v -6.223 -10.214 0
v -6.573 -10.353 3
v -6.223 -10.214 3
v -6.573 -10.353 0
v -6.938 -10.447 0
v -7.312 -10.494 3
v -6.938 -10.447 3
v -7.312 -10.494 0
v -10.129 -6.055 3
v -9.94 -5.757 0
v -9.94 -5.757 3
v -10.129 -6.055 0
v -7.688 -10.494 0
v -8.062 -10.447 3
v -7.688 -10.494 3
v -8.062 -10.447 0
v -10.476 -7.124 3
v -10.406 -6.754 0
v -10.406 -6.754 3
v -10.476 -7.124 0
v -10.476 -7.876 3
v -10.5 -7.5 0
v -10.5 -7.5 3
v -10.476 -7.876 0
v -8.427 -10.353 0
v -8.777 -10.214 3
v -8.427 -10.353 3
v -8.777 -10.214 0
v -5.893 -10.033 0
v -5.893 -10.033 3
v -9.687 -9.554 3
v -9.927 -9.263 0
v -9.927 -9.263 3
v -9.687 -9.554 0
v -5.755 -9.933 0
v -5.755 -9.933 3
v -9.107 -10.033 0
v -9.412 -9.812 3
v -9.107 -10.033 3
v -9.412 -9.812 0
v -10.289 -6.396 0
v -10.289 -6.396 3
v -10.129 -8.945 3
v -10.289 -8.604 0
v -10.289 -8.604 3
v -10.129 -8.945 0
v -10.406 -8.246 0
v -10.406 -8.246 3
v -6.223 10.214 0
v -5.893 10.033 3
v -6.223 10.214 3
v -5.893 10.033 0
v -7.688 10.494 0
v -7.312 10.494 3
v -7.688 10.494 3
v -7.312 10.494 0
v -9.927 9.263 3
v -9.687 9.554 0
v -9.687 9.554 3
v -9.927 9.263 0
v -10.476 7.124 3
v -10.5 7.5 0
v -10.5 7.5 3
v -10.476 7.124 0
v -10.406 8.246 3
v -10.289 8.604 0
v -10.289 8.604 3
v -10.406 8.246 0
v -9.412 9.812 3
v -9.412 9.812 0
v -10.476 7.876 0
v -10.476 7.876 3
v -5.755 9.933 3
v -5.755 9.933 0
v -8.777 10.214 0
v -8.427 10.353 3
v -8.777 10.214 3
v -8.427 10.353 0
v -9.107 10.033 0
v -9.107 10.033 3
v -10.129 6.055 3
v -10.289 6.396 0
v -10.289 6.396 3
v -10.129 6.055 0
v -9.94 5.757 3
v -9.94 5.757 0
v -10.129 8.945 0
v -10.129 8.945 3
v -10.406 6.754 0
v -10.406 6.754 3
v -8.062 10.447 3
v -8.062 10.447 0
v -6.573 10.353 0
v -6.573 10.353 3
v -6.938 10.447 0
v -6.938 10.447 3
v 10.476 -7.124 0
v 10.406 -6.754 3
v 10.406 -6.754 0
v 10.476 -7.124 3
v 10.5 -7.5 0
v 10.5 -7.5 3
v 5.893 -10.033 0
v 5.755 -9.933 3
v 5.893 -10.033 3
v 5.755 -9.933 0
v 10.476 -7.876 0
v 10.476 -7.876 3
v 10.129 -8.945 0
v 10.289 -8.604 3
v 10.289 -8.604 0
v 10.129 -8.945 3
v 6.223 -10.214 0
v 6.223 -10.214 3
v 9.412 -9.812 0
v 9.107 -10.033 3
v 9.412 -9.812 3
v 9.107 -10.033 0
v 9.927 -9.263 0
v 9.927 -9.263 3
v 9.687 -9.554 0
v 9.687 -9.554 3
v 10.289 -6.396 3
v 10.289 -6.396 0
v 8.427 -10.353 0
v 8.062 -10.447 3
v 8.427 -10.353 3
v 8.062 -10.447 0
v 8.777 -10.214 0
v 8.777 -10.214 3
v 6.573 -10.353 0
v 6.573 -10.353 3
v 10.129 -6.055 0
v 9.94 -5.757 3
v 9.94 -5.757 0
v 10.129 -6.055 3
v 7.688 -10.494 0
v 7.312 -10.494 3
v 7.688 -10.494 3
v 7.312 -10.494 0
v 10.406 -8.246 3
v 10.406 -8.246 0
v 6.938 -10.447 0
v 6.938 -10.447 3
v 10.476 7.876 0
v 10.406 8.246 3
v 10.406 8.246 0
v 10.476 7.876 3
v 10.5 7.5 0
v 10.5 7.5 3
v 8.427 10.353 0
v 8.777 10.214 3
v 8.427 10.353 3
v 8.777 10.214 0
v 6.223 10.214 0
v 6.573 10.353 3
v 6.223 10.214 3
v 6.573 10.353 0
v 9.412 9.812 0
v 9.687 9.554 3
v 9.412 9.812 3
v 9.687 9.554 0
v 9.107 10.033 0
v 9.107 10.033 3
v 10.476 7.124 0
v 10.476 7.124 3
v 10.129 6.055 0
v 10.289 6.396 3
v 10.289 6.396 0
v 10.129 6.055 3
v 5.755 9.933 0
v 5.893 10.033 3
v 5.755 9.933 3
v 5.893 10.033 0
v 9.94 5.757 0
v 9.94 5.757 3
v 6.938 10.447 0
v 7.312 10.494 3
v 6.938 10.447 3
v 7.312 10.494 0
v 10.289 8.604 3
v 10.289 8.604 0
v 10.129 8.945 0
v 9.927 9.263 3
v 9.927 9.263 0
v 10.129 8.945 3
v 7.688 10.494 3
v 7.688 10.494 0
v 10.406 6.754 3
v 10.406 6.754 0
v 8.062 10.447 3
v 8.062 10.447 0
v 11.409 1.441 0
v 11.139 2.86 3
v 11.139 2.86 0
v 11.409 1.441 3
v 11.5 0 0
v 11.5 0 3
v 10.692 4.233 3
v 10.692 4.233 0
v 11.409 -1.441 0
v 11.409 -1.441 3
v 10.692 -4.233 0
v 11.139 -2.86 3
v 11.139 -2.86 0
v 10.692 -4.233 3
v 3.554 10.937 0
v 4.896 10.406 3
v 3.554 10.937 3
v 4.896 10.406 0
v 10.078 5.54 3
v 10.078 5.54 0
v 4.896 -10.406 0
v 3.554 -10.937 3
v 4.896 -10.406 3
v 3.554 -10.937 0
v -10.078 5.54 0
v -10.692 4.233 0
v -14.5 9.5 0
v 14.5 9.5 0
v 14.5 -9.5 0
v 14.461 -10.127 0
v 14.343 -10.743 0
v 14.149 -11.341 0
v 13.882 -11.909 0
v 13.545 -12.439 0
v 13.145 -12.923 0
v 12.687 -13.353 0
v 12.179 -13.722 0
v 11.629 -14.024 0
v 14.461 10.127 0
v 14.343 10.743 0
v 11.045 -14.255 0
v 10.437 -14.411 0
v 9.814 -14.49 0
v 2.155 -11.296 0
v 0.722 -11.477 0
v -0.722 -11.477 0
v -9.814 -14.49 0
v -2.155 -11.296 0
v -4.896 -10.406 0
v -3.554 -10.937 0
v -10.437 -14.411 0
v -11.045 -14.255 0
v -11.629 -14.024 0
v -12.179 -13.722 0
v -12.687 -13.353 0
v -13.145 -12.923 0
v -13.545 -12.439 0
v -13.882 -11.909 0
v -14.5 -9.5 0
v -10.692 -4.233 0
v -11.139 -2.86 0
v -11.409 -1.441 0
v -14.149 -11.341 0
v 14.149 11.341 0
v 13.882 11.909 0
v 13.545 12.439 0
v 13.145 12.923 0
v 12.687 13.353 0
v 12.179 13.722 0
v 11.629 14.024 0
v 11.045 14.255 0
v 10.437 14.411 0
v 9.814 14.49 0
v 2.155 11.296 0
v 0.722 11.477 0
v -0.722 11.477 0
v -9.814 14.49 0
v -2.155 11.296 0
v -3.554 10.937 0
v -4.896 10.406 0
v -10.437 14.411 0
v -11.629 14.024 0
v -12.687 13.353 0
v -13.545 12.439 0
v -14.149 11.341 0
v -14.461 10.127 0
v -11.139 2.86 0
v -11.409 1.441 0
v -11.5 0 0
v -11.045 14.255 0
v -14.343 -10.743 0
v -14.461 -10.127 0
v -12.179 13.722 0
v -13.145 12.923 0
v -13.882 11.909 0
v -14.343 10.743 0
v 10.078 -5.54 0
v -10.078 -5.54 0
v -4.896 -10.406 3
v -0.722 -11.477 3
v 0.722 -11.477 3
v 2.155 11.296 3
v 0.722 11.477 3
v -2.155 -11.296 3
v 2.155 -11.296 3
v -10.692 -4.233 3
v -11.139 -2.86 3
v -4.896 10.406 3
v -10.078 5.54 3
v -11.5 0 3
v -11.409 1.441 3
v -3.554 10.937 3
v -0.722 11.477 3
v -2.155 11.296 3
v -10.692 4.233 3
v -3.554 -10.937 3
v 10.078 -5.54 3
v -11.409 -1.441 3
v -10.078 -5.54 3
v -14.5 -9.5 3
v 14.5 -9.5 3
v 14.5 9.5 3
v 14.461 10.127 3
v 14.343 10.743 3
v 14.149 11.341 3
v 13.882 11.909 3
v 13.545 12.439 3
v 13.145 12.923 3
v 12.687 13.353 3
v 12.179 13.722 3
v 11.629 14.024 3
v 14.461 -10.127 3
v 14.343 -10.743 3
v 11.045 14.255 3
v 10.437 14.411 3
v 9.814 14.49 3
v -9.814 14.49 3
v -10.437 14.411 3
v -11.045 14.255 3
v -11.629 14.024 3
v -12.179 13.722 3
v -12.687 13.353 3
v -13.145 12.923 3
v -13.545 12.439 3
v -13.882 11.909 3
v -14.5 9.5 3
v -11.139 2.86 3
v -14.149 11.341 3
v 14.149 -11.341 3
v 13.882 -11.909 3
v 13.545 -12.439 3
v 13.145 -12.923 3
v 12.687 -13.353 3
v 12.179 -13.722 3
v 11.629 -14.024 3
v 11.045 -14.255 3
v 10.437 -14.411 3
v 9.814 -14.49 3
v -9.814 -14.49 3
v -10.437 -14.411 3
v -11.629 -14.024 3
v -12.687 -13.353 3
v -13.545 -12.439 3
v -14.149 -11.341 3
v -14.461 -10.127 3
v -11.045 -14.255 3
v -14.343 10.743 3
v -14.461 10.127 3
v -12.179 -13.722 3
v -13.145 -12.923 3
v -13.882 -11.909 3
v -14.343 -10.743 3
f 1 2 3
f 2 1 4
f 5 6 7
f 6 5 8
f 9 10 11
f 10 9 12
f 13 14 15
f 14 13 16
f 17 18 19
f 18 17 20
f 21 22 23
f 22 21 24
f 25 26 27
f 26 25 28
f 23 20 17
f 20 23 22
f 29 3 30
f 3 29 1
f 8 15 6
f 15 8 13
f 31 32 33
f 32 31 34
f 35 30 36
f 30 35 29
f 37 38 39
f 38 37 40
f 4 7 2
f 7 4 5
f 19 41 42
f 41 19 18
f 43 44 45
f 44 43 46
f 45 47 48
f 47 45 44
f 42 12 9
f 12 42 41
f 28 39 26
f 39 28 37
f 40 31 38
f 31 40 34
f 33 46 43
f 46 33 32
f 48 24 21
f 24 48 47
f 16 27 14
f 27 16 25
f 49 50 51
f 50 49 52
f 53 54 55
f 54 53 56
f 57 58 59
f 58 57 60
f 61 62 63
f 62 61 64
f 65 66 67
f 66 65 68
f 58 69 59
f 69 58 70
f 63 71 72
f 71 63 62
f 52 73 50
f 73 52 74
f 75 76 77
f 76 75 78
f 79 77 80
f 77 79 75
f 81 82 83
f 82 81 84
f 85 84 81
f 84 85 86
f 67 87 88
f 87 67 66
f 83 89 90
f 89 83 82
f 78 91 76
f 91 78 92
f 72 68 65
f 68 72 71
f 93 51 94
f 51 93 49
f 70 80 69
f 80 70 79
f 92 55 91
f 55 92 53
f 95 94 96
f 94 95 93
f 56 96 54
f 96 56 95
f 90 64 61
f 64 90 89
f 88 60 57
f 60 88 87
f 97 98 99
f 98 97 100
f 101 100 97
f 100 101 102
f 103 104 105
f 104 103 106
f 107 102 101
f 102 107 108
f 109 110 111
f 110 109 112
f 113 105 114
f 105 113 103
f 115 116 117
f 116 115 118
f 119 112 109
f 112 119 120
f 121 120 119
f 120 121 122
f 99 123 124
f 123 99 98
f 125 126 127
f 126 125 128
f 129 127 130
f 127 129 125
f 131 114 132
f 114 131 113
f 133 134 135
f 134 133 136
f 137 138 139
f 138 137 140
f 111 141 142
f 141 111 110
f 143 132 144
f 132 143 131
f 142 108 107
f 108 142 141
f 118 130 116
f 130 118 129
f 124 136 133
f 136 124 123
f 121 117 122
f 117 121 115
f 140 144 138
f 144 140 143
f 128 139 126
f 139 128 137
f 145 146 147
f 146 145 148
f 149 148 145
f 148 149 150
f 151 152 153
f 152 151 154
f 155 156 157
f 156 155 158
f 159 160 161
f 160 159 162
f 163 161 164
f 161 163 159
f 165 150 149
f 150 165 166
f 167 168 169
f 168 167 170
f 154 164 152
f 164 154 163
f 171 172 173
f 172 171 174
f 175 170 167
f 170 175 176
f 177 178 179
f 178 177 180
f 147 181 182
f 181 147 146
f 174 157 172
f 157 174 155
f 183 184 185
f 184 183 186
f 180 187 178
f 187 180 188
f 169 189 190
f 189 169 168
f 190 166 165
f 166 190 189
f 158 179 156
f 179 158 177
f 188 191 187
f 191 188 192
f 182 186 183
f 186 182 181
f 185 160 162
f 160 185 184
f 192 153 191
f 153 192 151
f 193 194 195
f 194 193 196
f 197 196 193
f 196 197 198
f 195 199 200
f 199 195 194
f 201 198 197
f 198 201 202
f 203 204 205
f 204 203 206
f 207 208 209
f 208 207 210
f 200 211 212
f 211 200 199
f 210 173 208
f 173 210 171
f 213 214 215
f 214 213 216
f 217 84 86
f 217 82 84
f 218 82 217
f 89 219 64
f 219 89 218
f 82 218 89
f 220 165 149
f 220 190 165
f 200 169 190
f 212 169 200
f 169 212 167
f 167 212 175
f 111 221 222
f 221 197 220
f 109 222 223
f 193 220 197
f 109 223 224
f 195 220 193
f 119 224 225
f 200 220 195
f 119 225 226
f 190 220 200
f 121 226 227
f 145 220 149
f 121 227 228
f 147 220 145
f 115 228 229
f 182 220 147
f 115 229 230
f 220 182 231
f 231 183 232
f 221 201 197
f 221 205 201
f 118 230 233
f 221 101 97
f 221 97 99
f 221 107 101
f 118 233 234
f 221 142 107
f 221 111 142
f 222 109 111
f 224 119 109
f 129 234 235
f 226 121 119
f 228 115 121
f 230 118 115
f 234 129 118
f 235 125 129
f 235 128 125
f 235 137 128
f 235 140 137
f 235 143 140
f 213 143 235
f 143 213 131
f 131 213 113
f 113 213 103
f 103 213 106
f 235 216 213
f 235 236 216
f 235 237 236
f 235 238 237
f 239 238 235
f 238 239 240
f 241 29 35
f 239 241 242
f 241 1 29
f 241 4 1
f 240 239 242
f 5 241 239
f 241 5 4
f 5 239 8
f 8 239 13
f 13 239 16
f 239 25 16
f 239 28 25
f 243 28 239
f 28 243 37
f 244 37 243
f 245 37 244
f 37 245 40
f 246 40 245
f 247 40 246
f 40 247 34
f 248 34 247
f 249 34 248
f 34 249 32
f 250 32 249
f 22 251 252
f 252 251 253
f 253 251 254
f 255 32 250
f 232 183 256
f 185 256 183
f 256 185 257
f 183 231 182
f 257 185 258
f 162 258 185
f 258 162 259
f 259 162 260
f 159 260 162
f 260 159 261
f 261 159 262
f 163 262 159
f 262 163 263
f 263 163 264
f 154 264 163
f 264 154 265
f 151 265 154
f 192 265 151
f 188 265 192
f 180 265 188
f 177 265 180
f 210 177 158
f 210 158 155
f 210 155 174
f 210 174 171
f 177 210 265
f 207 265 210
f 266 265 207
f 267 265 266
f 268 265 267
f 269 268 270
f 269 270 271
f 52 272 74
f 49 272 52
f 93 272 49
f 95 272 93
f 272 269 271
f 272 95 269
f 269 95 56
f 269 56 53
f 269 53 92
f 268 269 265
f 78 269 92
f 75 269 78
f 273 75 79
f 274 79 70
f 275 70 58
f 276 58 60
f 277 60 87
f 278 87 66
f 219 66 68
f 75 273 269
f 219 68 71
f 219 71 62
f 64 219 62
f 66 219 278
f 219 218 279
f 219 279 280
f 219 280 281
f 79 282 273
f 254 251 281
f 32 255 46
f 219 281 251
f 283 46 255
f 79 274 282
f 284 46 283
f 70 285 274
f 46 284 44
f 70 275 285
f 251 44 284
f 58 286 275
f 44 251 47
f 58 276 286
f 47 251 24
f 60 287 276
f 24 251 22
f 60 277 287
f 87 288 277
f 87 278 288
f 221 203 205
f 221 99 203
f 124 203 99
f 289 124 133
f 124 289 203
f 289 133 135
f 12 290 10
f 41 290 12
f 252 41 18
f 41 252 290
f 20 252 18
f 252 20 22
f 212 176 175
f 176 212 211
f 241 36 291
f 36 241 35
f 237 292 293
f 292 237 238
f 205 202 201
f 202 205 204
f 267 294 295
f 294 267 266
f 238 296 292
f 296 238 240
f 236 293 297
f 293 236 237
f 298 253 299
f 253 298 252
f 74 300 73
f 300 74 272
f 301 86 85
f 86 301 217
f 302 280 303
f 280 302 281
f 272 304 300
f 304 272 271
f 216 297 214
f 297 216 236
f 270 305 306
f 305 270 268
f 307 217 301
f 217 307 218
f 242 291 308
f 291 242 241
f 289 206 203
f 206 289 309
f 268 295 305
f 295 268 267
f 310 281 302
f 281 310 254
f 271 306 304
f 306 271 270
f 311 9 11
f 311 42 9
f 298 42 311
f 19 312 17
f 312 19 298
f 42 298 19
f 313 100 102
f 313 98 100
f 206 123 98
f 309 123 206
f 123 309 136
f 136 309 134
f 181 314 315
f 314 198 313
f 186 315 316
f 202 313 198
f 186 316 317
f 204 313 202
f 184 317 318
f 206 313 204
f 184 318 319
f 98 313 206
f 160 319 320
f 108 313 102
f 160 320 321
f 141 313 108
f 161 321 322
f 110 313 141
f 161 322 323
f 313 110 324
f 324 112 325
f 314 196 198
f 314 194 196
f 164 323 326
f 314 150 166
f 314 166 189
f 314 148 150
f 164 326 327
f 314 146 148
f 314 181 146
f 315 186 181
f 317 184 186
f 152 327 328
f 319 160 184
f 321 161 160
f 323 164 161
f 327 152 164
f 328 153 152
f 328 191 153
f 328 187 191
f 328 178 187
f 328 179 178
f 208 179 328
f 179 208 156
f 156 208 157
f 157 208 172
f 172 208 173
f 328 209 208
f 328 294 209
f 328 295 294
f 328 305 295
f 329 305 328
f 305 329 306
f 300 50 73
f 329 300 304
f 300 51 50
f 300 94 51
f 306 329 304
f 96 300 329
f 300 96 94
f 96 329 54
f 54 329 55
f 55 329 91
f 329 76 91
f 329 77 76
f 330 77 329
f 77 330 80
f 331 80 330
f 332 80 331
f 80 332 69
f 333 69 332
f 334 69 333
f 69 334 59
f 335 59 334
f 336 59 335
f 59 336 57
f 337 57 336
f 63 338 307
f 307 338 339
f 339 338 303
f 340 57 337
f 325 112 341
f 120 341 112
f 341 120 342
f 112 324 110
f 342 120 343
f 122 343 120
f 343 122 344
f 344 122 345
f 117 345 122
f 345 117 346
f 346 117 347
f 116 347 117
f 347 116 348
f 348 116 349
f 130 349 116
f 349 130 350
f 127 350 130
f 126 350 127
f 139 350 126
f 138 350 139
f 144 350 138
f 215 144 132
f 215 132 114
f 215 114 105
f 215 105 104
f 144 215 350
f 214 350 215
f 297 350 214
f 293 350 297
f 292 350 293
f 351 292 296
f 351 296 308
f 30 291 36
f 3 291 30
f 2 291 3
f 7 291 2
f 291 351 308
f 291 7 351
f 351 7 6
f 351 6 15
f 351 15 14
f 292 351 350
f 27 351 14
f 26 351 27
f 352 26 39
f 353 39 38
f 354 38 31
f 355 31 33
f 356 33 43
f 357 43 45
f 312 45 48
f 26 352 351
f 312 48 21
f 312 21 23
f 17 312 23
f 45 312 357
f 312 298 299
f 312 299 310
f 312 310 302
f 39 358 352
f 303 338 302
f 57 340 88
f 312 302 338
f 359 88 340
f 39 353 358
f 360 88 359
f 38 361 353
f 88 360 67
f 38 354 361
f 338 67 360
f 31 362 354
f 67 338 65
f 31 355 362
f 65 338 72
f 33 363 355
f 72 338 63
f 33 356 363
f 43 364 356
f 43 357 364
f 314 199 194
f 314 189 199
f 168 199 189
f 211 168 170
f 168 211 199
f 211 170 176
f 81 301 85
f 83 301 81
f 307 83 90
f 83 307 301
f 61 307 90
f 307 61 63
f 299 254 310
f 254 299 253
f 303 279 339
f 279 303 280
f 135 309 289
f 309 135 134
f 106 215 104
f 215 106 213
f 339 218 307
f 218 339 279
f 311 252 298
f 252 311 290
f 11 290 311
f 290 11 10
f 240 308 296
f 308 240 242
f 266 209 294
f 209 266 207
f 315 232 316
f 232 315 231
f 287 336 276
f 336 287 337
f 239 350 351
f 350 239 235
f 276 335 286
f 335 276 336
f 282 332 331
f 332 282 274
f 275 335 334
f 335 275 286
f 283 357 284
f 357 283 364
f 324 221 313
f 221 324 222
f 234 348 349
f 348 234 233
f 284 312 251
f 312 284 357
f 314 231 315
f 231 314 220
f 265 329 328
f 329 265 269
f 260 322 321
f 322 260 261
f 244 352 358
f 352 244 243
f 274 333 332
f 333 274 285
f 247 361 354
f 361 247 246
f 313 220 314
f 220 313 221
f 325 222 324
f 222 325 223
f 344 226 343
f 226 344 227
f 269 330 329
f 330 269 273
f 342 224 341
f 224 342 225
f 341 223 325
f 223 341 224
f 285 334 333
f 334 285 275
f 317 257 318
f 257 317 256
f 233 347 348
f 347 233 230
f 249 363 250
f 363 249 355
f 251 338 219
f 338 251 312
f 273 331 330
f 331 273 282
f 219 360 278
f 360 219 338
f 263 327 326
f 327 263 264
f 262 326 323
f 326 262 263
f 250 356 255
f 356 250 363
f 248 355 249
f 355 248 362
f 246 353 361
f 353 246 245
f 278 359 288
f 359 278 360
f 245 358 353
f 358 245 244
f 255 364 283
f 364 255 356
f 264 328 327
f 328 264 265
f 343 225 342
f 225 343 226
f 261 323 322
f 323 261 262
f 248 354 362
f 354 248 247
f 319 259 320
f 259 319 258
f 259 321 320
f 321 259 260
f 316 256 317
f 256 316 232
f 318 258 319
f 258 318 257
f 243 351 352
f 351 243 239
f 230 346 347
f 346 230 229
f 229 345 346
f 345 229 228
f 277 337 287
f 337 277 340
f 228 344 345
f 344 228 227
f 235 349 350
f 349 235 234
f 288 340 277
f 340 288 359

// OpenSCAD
$fn = 50;


difference() {
	union() {
		hull() {
			translate(v = [-9.5000000000, 9.5000000000, 0]) {
				cylinder(h = 3, r = 5);
			}
			translate(v = [9.5000000000, 9.5000000000, 0]) {
				cylinder(h = 3, r = 5);
			}
			translate(v = [-9.5000000000, -9.5000000000, 0]) {
				cylinder(h = 3, r = 5);
			}
			translate(v = [9.5000000000, -9.5000000000, 0]) {
				cylinder(h = 3, r = 5);
			}
		}
	}
	union() {
		#translate(v = [-7.5000000000, -7.5000000000, -100.0000000000]) {
			cylinder(h = 200, r = 3.0000000000);
		}
		#translate(v = [-7.5000000000, 7.5000000000, -100.0000000000]) {
			cylinder(h = 200, r = 3.0000000000);
		}
		#translate(v = [7.5000000000, -7.5000000000, -100.0000000000]) {
			cylinder(h = 200, r = 3.0000000000);
		}
		#translate(v = [7.5000000000, 7.5000000000, -100.0000000000]) {
			cylinder(h = 200, r = 3.0000000000);
		}
		#cylinder(h = 3, r = 11.5000000000);
	}
}
